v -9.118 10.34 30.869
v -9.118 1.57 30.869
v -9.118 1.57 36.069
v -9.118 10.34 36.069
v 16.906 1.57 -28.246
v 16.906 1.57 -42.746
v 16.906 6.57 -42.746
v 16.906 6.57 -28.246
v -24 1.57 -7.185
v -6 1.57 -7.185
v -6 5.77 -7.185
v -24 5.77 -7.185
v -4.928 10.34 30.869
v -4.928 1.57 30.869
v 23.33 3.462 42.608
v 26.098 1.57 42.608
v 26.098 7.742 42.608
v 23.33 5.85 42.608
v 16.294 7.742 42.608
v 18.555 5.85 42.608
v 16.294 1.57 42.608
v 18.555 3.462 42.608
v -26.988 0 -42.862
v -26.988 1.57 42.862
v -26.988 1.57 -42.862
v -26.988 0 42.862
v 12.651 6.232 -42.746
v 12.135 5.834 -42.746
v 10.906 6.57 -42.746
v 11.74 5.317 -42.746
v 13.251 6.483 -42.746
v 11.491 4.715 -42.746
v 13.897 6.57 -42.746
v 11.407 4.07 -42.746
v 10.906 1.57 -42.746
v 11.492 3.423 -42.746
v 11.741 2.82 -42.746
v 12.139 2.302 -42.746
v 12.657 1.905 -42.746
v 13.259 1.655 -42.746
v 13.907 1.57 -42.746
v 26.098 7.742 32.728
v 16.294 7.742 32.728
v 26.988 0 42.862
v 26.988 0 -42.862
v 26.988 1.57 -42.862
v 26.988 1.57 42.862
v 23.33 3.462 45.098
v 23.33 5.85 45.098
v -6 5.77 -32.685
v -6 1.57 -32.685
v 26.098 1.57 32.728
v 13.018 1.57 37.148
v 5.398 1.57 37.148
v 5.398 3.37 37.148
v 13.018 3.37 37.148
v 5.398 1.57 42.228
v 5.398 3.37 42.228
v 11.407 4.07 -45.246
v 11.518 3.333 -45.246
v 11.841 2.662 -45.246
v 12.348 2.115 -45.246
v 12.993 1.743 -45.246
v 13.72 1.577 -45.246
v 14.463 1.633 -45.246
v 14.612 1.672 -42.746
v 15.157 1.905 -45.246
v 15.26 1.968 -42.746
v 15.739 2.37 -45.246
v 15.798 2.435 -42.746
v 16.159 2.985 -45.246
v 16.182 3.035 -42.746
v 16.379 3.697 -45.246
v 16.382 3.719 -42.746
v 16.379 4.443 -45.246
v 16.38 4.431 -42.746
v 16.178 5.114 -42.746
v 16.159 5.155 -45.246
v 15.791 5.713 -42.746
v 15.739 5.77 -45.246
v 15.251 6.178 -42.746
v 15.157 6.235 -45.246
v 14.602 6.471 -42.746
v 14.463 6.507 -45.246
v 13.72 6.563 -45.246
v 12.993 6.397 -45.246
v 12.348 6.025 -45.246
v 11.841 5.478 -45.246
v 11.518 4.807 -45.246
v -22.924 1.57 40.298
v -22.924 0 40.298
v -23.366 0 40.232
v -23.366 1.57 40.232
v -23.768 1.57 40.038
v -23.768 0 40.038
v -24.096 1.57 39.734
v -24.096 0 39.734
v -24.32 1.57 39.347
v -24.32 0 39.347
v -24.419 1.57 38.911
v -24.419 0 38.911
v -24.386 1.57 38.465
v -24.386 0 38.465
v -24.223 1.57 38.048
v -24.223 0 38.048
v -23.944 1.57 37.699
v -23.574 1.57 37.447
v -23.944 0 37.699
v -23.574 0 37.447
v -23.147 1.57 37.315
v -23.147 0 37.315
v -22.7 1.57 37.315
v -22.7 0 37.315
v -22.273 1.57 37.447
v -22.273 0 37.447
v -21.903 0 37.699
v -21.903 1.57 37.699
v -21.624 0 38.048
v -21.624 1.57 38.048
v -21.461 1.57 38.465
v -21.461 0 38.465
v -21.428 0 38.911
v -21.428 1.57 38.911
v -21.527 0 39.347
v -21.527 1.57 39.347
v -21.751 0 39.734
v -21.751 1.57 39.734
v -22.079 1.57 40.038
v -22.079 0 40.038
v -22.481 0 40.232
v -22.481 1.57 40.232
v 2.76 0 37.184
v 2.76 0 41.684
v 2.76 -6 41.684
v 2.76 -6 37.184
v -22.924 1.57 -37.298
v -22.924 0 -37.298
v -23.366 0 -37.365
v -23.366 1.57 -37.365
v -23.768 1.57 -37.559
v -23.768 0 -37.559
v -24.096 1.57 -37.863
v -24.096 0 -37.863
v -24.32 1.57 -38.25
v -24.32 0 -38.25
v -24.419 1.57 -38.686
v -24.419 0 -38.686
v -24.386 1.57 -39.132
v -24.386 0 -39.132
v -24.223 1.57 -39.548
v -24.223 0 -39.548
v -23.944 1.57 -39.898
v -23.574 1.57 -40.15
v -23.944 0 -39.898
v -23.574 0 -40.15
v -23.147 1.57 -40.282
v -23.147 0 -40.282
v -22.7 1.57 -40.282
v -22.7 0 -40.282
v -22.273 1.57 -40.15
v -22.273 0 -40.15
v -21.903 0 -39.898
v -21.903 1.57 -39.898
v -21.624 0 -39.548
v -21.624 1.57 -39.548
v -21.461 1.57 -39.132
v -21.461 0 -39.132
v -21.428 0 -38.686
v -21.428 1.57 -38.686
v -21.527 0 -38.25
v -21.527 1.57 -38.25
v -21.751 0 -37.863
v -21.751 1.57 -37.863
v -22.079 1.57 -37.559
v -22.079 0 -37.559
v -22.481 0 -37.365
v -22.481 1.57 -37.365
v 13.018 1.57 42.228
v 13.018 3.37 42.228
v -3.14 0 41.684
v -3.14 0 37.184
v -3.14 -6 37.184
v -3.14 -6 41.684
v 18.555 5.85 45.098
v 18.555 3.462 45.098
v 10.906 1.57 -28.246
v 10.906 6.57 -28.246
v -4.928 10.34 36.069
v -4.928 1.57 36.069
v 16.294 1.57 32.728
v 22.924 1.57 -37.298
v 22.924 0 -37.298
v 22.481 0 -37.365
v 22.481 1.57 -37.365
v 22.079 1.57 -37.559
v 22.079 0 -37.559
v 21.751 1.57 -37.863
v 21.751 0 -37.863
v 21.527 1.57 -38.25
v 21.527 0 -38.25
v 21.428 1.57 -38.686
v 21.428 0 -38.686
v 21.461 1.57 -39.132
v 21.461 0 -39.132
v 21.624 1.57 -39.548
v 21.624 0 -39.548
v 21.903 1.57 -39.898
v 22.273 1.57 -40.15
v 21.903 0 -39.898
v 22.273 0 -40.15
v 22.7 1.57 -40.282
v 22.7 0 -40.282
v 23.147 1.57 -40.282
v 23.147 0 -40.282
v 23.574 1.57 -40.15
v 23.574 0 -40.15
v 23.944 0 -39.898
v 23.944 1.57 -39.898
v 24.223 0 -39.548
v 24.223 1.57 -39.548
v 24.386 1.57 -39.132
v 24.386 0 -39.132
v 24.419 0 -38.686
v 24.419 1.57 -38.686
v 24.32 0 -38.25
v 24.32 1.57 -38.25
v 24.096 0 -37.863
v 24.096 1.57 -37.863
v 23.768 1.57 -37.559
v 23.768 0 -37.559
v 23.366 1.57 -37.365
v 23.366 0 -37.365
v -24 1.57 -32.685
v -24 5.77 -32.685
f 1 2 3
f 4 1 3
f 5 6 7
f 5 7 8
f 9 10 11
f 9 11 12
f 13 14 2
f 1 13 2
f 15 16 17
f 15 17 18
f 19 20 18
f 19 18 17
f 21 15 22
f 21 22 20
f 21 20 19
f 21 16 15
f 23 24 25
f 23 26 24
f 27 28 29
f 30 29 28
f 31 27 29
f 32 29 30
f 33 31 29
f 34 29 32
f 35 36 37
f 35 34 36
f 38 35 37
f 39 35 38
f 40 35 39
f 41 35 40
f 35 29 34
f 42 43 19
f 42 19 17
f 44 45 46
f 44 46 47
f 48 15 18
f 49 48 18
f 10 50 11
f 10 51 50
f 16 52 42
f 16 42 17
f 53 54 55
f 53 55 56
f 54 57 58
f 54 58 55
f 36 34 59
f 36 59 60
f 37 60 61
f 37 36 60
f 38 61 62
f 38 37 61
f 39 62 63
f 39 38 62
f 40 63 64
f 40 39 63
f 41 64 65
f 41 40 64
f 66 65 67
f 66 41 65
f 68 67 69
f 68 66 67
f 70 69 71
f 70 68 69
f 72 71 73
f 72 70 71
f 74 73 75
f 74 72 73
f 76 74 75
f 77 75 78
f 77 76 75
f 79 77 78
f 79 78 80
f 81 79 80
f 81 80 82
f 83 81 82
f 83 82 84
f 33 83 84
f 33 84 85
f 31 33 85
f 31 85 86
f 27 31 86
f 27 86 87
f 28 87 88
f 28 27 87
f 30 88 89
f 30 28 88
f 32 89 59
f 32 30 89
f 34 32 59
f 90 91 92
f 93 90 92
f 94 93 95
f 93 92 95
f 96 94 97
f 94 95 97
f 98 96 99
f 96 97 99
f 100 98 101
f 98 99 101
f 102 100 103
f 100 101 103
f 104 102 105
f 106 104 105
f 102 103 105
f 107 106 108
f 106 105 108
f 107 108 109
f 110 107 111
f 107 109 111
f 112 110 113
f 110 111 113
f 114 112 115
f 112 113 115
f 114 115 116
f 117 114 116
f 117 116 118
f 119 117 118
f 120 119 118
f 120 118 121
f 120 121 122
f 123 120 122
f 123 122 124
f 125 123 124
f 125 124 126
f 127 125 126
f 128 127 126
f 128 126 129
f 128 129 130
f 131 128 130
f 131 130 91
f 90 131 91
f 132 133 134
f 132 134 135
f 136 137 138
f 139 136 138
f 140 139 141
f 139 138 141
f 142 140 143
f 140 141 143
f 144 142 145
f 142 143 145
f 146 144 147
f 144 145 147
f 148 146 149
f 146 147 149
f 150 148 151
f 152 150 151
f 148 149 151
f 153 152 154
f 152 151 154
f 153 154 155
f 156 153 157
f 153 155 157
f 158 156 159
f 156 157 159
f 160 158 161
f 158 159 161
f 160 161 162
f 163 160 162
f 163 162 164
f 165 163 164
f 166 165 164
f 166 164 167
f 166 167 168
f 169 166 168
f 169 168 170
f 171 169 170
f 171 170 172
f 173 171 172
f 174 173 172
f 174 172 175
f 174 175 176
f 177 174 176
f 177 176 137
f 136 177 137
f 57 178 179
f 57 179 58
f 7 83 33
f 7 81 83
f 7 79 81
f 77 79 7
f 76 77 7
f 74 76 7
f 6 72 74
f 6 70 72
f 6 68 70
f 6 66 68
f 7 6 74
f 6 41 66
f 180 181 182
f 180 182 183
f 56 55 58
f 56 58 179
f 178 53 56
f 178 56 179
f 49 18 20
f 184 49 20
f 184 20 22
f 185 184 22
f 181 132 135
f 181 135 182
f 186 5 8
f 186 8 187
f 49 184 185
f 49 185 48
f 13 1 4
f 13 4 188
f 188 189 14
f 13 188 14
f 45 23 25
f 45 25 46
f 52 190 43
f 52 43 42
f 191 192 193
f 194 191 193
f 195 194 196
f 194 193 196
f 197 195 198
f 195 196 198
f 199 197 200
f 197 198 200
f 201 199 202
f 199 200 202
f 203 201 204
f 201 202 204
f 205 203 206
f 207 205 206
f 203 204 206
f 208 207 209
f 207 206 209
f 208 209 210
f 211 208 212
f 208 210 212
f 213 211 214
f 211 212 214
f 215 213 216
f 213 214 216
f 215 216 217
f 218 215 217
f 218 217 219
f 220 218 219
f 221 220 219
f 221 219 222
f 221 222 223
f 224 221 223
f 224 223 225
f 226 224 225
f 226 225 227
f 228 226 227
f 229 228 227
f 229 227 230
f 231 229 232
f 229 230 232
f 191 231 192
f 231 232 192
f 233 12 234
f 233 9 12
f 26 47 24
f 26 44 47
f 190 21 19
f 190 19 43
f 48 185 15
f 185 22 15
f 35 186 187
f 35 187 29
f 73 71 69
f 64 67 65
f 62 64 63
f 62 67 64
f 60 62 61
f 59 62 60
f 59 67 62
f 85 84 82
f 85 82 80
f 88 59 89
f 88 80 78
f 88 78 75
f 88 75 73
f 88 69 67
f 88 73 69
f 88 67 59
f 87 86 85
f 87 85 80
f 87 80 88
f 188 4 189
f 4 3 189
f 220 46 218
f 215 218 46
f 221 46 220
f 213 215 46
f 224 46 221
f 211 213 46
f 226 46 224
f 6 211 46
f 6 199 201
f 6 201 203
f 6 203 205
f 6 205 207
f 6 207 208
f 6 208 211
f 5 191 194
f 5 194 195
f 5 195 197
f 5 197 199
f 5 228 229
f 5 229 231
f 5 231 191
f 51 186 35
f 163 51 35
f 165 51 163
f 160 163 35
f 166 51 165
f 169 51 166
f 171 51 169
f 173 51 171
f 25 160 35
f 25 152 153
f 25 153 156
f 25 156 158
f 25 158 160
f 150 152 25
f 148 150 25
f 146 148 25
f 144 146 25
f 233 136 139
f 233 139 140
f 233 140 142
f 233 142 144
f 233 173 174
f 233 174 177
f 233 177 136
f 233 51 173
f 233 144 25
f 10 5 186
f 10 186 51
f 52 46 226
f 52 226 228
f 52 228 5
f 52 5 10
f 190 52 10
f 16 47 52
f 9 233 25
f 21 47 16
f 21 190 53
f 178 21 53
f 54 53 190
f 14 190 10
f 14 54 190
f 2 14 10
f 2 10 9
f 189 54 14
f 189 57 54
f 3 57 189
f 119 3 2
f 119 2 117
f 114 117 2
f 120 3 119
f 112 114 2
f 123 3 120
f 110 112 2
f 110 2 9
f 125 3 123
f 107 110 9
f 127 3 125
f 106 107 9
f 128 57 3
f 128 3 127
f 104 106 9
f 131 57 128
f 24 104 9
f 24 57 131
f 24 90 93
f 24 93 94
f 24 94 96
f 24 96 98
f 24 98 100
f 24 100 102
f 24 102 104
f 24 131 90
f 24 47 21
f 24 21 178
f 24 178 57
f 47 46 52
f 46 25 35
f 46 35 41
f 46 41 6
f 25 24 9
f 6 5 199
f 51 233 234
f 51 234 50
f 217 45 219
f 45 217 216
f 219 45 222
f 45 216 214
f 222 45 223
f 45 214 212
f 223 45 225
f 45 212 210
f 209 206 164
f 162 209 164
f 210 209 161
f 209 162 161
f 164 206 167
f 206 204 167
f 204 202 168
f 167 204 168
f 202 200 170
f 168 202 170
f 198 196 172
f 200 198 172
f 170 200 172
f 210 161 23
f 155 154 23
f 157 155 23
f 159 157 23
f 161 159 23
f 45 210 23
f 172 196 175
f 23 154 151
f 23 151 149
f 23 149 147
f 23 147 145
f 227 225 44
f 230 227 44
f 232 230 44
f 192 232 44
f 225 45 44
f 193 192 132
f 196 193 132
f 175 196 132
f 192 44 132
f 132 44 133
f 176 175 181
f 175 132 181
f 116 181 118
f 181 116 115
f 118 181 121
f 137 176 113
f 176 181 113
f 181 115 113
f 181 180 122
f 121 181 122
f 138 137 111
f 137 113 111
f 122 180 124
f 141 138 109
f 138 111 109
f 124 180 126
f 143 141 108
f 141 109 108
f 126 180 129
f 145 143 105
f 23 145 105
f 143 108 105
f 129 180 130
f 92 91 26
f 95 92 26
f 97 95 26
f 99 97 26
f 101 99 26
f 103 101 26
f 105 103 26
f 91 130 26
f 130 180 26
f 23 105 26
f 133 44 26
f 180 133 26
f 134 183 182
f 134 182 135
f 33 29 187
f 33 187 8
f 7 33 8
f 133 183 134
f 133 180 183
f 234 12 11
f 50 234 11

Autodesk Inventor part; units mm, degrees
ref_plane "YZ Plane" through (0, 0, 0) normal (1, 0, 0) x (0, 1, 0)
ref_plane "XZ Plane" through (0, 0, 0) normal (0, 1, 0) x (-1, 0, 0)
ref_plane "XY Plane" through (0, 0, 0) normal (0, 0, 1) x (1, 0, 0)
sketch "Sketch1" plane through (0, 0, 0) normal (0, 1, 0) x (-1, 0, 0)
  line L0 (-26.9875, 42.8625) -> (26.9875, 42.8625)
  line L1 (26.9875, 42.8625) -> (26.9875, -42.8625)
  line L2 (26.9875, -42.8625) -> (-26.9875, -42.8625)
  line L3 (-26.9875, -42.8625) -> (-26.9875, 42.8625)
  line L4 (-26.9875, 42.8625) -> (26.9875, -42.8625) construction
  line L5 (26.9875, 42.8625) -> (-26.9875, -42.8625) construction
  point P0 (0, 0)
  dimension "d0" = 53.975
  dimension "d1" = 85.725
extrude "Extrusion1" add sketch "Sketch1" along normal blind 1.57
sketch "Sketch2" plane through (0, 1.57, 0) normal (0, 1, 0) x (1, 0, 0)
  line L0 (-26.9875, -42.8625) -> (26.9875, -42.8625) projected
  line L1 (-26.9875, 42.8625) -> (-26.9875, -42.8625) projected
  line L2 (26.9875, 42.8625) -> (-26.9875, 42.8625) projected
  line L3 (26.9875, -42.8625) -> (26.9875, 42.8625) projected
  point P0 (0, 0)
  point P1 (-22.9235, -38.7985)
  point P2 (-22.9235, 38.7985)
  point P3 (22.9235, 38.7985)
  dimension "d4" = 4.064
  dimension "d5" = 4.064
  dimension "d6" = 4.064
  dimension "d7" = 4.064
  dimension "d8" = 4.064
  dimension "d9" = 4.064
hole "Hole1" at (-22.9235, 1.57, 38.7985) at (-22.9235, 1.57, -38.7985) at (22.9235, 1.57, -38.7985) direction (0, -1, 0) diameter 3 depth 2.54
sketch "Sketch3" plane through (0, 1.57, 0) normal (0, 1, 0) x (1, 0, 0)
  line L0 (26.9875, -42.8625) -> (26.9875, 42.8625) projected
  line L1 (26.9875, 42.8625) -> (-26.9875, 42.8625) projected
  line L2 (16.9065, 28.2465) -> (10.9065, 28.2465)
  line L3 (10.9065, 28.2465) -> (10.9065, 42.7465)
  line L4 (10.9065, 42.7465) -> (16.9065, 42.7465)
  line L5 (16.9065, 42.7465) -> (16.9065, 28.2465)
  line L6 (16.9065, 28.2465) -> (10.9065, 42.7465) construction
  line L7 (10.9065, 28.2465) -> (16.9065, 42.7465) construction
  point P0 (0, 0)
  point P1 (13.9065, 35.4965)
  dimension "d17" = 13.081
  dimension "d18" = 7.366
  dimension "d19" = 14.5
  dimension "d20" = 6
extrude "Extrusion2" add sketch "Sketch3" along normal blind 5
sketch "Sketch4" plane through (16.9065, 1.57, -42.7465) normal (0, 0, -1) x (-1, 0, 0)
  line L0 (6, 0) -> (6, 5) projected
  circle A0 centre (3, 2.5) radius 2.5
  point P0 (16.9065, -1.57)
  dimension "d23" = 5
extrude "Extrusion3" add sketch "Sketch4" along normal blind 2.5
sketch "Sketch5" plane through (0, 1.57, 0) normal (0, 1, 0) x (1, 0, 0)
  line L0 (-26.9875, -42.8625) -> (26.9875, -42.8625) projected
  line L1 (26.9875, -42.8625) -> (26.9875, 42.8625) projected
  line L2 (-4.9284, -30.8693) -> (-9.1184, -30.8693)
  line L3 (-9.1184, -30.8693) -> (-9.1184, -36.0693)
  line L4 (-9.1184, -36.0693) -> (-4.9284, -36.0693)
  line L5 (-4.9284, -36.0693) -> (-4.9284, -30.8693)
  line L6 (-4.9284, -30.8693) -> (-9.1184, -36.0693) construction
  line L7 (-9.1184, -30.8693) -> (-4.9284, -36.0693) construction
  point P0 (0, 0)
  point P1 (-7.3025, -33.9725)
  point P2 (-7.0234, -33.4693)
  dimension "d26" = 8.89
  dimension "d27" = 34.29
  dimension "d28" = 5.2
  dimension "d29" = 4.19
extrude "Extrusion4" add sketch "Sketch5" along normal blind 8.77
sketch "Sketch6" plane through (0, 1.57, 0) normal (0, 1, 0) x (1, 0, 0)
  line L0 (-6.0004, 7.1846) -> (-24.0004, 7.1846)
  line L1 (-24.0004, 7.1846) -> (-24.0004, 32.6846)
  line L2 (-24.0004, 32.6846) -> (-6.0004, 32.6846)
  line L3 (-6.0004, 32.6846) -> (-6.0004, 7.1846)
  line L4 (-6.0004, 7.1846) -> (-24.0004, 32.6846) construction
  line L5 (-24.0004, 7.1846) -> (-6.0004, 32.6846) construction
  point P0 (0, 0)
  point P1 (-15.0004, 19.9346)
  dimension "d34" = 25.5
  dimension "d35" = 18
extrude "Extrusion5" add sketch "Sketch6" along normal blind 4.2
sketch "Sketch7" plane through (0, 0, 0) normal (0, -1, 0) x (1, 0, 0)
  line L0 (2.7595, 37.1835) -> (-3.1405, 37.1835)
  line L1 (-3.1405, 37.1835) -> (-3.1405, 41.6835)
  line L2 (-3.1405, 41.6835) -> (2.7595, 41.6835)
  line L3 (2.7595, 41.6835) -> (2.7595, 37.1835)
  line L4 (2.7595, 37.1835) -> (-3.1405, 41.6835) construction
  line L5 (-3.1405, 37.1835) -> (2.7595, 41.6835) construction
  line L6 (-26.9875, 42.8625) -> (26.9875, 42.8625) projected
  line L7 (-26.9875, -42.8625) -> (-26.9875, 42.8625) projected
  line L8 (26.9875, 42.8625) -> (26.9875, -42.8625) projected
  point P0 (0, 0)
  point P1 (-0.1905, 39.4335)
  dimension "d36" = 4.5
  dimension "d37" = 5.9
  dimension "d38" = 3.429
  dimension "d40" = 27.178
extrude "Extrusion6" add sketch "Sketch7" along normal blind 6
sketch "Sketch8" plane through (0, 1.57, 0) normal (0, 1, 0) x (1, 0, 0)
  line L0 (26.0985, -42.6085) -> (16.2941, -42.6085)
  line L1 (16.2941, -42.6085) -> (16.2941, -32.7279)
  line L2 (16.2941, -32.7279) -> (26.0985, -32.7279)
  line L3 (26.0985, -32.7279) -> (26.0985, -42.6085)
  line L4 (26.0985, -42.6085) -> (16.2941, -32.7279) construction
  line L5 (16.2941, -42.6085) -> (26.0985, -32.7279) construction
  line L6 (26.9875, -42.8625) -> (26.9875, 42.8625) projected
  line L7 (-26.9875, -42.8625) -> (26.9875, -42.8625) projected
  point P0 (0, 0)
  point P1 (21.1963, -37.6682)
  dimension "d43" = 9.8044
  dimension "d44" = 9.8806
  dimension "d45" = 0.889
  dimension "d46" = 0.254
extrude "Extrusion7" add sketch "Sketch8" along normal blind 6.1722
sketch "Sketch9" plane through (16.2941, 1.57, 42.6085) normal (0, 0, 1) x (1, 0, 0)
  line L0 (0, 0) -> (0, 6.1722) projected
  line L1 (7.0358, 4.2799) -> (2.2606, 4.2799)
  line L2 (2.2606, 4.2799) -> (2.2606, 1.8923)
  line L3 (2.2606, 1.8923) -> (7.0358, 1.8923)
  line L4 (7.0358, 1.8923) -> (7.0358, 4.2799)
  line L5 (7.0358, 4.2799) -> (2.2606, 1.8923) construction
  line L6 (2.2606, 4.2799) -> (7.0358, 1.8923) construction
  line L7 (0, 6.1722) -> (9.8044, 6.1722) projected
  point P0 (-16.2941, -1.57)
  point P1 (4.6482, 3.0861)
  dimension "d52" = 3.0861
  dimension "d53" = 2.2606
extrude "Extrusion8" add sketch "Sketch9" along normal blind 2.4892
sketch "Sketch10" plane through (0, 1.57, 0) normal (0, 1, 0) x (1, 0, 0)
  line L0 (26.9875, -42.8625) -> (26.9875, 42.8625) projected
  line L1 (-26.9875, -42.8625) -> (26.9875, -42.8625) projected
  line L2 (13.0175, -42.2275) -> (5.3975, -42.2275)
  line L3 (5.3975, -42.2275) -> (5.3975, -37.1475)
  line L4 (5.3975, -37.1475) -> (13.0175, -37.1475)
  line L5 (13.0175, -37.1475) -> (13.0175, -42.2275)
  line L6 (13.0175, -42.2275) -> (5.3975, -37.1475) construction
  line L7 (5.3975, -42.2275) -> (13.0175, -37.1475) construction
  point P0 (0, 0)
  point P1 (9.2075, -39.6875)
  dimension "d56" = 17.78
  dimension "d57" = 3.175
  dimension "d58" = 7.62
  dimension "d59" = 5.08
extrude "Extrusion9" add sketch "Sketch10" along normal blind 1.8
properties part number "ECG PCB"
